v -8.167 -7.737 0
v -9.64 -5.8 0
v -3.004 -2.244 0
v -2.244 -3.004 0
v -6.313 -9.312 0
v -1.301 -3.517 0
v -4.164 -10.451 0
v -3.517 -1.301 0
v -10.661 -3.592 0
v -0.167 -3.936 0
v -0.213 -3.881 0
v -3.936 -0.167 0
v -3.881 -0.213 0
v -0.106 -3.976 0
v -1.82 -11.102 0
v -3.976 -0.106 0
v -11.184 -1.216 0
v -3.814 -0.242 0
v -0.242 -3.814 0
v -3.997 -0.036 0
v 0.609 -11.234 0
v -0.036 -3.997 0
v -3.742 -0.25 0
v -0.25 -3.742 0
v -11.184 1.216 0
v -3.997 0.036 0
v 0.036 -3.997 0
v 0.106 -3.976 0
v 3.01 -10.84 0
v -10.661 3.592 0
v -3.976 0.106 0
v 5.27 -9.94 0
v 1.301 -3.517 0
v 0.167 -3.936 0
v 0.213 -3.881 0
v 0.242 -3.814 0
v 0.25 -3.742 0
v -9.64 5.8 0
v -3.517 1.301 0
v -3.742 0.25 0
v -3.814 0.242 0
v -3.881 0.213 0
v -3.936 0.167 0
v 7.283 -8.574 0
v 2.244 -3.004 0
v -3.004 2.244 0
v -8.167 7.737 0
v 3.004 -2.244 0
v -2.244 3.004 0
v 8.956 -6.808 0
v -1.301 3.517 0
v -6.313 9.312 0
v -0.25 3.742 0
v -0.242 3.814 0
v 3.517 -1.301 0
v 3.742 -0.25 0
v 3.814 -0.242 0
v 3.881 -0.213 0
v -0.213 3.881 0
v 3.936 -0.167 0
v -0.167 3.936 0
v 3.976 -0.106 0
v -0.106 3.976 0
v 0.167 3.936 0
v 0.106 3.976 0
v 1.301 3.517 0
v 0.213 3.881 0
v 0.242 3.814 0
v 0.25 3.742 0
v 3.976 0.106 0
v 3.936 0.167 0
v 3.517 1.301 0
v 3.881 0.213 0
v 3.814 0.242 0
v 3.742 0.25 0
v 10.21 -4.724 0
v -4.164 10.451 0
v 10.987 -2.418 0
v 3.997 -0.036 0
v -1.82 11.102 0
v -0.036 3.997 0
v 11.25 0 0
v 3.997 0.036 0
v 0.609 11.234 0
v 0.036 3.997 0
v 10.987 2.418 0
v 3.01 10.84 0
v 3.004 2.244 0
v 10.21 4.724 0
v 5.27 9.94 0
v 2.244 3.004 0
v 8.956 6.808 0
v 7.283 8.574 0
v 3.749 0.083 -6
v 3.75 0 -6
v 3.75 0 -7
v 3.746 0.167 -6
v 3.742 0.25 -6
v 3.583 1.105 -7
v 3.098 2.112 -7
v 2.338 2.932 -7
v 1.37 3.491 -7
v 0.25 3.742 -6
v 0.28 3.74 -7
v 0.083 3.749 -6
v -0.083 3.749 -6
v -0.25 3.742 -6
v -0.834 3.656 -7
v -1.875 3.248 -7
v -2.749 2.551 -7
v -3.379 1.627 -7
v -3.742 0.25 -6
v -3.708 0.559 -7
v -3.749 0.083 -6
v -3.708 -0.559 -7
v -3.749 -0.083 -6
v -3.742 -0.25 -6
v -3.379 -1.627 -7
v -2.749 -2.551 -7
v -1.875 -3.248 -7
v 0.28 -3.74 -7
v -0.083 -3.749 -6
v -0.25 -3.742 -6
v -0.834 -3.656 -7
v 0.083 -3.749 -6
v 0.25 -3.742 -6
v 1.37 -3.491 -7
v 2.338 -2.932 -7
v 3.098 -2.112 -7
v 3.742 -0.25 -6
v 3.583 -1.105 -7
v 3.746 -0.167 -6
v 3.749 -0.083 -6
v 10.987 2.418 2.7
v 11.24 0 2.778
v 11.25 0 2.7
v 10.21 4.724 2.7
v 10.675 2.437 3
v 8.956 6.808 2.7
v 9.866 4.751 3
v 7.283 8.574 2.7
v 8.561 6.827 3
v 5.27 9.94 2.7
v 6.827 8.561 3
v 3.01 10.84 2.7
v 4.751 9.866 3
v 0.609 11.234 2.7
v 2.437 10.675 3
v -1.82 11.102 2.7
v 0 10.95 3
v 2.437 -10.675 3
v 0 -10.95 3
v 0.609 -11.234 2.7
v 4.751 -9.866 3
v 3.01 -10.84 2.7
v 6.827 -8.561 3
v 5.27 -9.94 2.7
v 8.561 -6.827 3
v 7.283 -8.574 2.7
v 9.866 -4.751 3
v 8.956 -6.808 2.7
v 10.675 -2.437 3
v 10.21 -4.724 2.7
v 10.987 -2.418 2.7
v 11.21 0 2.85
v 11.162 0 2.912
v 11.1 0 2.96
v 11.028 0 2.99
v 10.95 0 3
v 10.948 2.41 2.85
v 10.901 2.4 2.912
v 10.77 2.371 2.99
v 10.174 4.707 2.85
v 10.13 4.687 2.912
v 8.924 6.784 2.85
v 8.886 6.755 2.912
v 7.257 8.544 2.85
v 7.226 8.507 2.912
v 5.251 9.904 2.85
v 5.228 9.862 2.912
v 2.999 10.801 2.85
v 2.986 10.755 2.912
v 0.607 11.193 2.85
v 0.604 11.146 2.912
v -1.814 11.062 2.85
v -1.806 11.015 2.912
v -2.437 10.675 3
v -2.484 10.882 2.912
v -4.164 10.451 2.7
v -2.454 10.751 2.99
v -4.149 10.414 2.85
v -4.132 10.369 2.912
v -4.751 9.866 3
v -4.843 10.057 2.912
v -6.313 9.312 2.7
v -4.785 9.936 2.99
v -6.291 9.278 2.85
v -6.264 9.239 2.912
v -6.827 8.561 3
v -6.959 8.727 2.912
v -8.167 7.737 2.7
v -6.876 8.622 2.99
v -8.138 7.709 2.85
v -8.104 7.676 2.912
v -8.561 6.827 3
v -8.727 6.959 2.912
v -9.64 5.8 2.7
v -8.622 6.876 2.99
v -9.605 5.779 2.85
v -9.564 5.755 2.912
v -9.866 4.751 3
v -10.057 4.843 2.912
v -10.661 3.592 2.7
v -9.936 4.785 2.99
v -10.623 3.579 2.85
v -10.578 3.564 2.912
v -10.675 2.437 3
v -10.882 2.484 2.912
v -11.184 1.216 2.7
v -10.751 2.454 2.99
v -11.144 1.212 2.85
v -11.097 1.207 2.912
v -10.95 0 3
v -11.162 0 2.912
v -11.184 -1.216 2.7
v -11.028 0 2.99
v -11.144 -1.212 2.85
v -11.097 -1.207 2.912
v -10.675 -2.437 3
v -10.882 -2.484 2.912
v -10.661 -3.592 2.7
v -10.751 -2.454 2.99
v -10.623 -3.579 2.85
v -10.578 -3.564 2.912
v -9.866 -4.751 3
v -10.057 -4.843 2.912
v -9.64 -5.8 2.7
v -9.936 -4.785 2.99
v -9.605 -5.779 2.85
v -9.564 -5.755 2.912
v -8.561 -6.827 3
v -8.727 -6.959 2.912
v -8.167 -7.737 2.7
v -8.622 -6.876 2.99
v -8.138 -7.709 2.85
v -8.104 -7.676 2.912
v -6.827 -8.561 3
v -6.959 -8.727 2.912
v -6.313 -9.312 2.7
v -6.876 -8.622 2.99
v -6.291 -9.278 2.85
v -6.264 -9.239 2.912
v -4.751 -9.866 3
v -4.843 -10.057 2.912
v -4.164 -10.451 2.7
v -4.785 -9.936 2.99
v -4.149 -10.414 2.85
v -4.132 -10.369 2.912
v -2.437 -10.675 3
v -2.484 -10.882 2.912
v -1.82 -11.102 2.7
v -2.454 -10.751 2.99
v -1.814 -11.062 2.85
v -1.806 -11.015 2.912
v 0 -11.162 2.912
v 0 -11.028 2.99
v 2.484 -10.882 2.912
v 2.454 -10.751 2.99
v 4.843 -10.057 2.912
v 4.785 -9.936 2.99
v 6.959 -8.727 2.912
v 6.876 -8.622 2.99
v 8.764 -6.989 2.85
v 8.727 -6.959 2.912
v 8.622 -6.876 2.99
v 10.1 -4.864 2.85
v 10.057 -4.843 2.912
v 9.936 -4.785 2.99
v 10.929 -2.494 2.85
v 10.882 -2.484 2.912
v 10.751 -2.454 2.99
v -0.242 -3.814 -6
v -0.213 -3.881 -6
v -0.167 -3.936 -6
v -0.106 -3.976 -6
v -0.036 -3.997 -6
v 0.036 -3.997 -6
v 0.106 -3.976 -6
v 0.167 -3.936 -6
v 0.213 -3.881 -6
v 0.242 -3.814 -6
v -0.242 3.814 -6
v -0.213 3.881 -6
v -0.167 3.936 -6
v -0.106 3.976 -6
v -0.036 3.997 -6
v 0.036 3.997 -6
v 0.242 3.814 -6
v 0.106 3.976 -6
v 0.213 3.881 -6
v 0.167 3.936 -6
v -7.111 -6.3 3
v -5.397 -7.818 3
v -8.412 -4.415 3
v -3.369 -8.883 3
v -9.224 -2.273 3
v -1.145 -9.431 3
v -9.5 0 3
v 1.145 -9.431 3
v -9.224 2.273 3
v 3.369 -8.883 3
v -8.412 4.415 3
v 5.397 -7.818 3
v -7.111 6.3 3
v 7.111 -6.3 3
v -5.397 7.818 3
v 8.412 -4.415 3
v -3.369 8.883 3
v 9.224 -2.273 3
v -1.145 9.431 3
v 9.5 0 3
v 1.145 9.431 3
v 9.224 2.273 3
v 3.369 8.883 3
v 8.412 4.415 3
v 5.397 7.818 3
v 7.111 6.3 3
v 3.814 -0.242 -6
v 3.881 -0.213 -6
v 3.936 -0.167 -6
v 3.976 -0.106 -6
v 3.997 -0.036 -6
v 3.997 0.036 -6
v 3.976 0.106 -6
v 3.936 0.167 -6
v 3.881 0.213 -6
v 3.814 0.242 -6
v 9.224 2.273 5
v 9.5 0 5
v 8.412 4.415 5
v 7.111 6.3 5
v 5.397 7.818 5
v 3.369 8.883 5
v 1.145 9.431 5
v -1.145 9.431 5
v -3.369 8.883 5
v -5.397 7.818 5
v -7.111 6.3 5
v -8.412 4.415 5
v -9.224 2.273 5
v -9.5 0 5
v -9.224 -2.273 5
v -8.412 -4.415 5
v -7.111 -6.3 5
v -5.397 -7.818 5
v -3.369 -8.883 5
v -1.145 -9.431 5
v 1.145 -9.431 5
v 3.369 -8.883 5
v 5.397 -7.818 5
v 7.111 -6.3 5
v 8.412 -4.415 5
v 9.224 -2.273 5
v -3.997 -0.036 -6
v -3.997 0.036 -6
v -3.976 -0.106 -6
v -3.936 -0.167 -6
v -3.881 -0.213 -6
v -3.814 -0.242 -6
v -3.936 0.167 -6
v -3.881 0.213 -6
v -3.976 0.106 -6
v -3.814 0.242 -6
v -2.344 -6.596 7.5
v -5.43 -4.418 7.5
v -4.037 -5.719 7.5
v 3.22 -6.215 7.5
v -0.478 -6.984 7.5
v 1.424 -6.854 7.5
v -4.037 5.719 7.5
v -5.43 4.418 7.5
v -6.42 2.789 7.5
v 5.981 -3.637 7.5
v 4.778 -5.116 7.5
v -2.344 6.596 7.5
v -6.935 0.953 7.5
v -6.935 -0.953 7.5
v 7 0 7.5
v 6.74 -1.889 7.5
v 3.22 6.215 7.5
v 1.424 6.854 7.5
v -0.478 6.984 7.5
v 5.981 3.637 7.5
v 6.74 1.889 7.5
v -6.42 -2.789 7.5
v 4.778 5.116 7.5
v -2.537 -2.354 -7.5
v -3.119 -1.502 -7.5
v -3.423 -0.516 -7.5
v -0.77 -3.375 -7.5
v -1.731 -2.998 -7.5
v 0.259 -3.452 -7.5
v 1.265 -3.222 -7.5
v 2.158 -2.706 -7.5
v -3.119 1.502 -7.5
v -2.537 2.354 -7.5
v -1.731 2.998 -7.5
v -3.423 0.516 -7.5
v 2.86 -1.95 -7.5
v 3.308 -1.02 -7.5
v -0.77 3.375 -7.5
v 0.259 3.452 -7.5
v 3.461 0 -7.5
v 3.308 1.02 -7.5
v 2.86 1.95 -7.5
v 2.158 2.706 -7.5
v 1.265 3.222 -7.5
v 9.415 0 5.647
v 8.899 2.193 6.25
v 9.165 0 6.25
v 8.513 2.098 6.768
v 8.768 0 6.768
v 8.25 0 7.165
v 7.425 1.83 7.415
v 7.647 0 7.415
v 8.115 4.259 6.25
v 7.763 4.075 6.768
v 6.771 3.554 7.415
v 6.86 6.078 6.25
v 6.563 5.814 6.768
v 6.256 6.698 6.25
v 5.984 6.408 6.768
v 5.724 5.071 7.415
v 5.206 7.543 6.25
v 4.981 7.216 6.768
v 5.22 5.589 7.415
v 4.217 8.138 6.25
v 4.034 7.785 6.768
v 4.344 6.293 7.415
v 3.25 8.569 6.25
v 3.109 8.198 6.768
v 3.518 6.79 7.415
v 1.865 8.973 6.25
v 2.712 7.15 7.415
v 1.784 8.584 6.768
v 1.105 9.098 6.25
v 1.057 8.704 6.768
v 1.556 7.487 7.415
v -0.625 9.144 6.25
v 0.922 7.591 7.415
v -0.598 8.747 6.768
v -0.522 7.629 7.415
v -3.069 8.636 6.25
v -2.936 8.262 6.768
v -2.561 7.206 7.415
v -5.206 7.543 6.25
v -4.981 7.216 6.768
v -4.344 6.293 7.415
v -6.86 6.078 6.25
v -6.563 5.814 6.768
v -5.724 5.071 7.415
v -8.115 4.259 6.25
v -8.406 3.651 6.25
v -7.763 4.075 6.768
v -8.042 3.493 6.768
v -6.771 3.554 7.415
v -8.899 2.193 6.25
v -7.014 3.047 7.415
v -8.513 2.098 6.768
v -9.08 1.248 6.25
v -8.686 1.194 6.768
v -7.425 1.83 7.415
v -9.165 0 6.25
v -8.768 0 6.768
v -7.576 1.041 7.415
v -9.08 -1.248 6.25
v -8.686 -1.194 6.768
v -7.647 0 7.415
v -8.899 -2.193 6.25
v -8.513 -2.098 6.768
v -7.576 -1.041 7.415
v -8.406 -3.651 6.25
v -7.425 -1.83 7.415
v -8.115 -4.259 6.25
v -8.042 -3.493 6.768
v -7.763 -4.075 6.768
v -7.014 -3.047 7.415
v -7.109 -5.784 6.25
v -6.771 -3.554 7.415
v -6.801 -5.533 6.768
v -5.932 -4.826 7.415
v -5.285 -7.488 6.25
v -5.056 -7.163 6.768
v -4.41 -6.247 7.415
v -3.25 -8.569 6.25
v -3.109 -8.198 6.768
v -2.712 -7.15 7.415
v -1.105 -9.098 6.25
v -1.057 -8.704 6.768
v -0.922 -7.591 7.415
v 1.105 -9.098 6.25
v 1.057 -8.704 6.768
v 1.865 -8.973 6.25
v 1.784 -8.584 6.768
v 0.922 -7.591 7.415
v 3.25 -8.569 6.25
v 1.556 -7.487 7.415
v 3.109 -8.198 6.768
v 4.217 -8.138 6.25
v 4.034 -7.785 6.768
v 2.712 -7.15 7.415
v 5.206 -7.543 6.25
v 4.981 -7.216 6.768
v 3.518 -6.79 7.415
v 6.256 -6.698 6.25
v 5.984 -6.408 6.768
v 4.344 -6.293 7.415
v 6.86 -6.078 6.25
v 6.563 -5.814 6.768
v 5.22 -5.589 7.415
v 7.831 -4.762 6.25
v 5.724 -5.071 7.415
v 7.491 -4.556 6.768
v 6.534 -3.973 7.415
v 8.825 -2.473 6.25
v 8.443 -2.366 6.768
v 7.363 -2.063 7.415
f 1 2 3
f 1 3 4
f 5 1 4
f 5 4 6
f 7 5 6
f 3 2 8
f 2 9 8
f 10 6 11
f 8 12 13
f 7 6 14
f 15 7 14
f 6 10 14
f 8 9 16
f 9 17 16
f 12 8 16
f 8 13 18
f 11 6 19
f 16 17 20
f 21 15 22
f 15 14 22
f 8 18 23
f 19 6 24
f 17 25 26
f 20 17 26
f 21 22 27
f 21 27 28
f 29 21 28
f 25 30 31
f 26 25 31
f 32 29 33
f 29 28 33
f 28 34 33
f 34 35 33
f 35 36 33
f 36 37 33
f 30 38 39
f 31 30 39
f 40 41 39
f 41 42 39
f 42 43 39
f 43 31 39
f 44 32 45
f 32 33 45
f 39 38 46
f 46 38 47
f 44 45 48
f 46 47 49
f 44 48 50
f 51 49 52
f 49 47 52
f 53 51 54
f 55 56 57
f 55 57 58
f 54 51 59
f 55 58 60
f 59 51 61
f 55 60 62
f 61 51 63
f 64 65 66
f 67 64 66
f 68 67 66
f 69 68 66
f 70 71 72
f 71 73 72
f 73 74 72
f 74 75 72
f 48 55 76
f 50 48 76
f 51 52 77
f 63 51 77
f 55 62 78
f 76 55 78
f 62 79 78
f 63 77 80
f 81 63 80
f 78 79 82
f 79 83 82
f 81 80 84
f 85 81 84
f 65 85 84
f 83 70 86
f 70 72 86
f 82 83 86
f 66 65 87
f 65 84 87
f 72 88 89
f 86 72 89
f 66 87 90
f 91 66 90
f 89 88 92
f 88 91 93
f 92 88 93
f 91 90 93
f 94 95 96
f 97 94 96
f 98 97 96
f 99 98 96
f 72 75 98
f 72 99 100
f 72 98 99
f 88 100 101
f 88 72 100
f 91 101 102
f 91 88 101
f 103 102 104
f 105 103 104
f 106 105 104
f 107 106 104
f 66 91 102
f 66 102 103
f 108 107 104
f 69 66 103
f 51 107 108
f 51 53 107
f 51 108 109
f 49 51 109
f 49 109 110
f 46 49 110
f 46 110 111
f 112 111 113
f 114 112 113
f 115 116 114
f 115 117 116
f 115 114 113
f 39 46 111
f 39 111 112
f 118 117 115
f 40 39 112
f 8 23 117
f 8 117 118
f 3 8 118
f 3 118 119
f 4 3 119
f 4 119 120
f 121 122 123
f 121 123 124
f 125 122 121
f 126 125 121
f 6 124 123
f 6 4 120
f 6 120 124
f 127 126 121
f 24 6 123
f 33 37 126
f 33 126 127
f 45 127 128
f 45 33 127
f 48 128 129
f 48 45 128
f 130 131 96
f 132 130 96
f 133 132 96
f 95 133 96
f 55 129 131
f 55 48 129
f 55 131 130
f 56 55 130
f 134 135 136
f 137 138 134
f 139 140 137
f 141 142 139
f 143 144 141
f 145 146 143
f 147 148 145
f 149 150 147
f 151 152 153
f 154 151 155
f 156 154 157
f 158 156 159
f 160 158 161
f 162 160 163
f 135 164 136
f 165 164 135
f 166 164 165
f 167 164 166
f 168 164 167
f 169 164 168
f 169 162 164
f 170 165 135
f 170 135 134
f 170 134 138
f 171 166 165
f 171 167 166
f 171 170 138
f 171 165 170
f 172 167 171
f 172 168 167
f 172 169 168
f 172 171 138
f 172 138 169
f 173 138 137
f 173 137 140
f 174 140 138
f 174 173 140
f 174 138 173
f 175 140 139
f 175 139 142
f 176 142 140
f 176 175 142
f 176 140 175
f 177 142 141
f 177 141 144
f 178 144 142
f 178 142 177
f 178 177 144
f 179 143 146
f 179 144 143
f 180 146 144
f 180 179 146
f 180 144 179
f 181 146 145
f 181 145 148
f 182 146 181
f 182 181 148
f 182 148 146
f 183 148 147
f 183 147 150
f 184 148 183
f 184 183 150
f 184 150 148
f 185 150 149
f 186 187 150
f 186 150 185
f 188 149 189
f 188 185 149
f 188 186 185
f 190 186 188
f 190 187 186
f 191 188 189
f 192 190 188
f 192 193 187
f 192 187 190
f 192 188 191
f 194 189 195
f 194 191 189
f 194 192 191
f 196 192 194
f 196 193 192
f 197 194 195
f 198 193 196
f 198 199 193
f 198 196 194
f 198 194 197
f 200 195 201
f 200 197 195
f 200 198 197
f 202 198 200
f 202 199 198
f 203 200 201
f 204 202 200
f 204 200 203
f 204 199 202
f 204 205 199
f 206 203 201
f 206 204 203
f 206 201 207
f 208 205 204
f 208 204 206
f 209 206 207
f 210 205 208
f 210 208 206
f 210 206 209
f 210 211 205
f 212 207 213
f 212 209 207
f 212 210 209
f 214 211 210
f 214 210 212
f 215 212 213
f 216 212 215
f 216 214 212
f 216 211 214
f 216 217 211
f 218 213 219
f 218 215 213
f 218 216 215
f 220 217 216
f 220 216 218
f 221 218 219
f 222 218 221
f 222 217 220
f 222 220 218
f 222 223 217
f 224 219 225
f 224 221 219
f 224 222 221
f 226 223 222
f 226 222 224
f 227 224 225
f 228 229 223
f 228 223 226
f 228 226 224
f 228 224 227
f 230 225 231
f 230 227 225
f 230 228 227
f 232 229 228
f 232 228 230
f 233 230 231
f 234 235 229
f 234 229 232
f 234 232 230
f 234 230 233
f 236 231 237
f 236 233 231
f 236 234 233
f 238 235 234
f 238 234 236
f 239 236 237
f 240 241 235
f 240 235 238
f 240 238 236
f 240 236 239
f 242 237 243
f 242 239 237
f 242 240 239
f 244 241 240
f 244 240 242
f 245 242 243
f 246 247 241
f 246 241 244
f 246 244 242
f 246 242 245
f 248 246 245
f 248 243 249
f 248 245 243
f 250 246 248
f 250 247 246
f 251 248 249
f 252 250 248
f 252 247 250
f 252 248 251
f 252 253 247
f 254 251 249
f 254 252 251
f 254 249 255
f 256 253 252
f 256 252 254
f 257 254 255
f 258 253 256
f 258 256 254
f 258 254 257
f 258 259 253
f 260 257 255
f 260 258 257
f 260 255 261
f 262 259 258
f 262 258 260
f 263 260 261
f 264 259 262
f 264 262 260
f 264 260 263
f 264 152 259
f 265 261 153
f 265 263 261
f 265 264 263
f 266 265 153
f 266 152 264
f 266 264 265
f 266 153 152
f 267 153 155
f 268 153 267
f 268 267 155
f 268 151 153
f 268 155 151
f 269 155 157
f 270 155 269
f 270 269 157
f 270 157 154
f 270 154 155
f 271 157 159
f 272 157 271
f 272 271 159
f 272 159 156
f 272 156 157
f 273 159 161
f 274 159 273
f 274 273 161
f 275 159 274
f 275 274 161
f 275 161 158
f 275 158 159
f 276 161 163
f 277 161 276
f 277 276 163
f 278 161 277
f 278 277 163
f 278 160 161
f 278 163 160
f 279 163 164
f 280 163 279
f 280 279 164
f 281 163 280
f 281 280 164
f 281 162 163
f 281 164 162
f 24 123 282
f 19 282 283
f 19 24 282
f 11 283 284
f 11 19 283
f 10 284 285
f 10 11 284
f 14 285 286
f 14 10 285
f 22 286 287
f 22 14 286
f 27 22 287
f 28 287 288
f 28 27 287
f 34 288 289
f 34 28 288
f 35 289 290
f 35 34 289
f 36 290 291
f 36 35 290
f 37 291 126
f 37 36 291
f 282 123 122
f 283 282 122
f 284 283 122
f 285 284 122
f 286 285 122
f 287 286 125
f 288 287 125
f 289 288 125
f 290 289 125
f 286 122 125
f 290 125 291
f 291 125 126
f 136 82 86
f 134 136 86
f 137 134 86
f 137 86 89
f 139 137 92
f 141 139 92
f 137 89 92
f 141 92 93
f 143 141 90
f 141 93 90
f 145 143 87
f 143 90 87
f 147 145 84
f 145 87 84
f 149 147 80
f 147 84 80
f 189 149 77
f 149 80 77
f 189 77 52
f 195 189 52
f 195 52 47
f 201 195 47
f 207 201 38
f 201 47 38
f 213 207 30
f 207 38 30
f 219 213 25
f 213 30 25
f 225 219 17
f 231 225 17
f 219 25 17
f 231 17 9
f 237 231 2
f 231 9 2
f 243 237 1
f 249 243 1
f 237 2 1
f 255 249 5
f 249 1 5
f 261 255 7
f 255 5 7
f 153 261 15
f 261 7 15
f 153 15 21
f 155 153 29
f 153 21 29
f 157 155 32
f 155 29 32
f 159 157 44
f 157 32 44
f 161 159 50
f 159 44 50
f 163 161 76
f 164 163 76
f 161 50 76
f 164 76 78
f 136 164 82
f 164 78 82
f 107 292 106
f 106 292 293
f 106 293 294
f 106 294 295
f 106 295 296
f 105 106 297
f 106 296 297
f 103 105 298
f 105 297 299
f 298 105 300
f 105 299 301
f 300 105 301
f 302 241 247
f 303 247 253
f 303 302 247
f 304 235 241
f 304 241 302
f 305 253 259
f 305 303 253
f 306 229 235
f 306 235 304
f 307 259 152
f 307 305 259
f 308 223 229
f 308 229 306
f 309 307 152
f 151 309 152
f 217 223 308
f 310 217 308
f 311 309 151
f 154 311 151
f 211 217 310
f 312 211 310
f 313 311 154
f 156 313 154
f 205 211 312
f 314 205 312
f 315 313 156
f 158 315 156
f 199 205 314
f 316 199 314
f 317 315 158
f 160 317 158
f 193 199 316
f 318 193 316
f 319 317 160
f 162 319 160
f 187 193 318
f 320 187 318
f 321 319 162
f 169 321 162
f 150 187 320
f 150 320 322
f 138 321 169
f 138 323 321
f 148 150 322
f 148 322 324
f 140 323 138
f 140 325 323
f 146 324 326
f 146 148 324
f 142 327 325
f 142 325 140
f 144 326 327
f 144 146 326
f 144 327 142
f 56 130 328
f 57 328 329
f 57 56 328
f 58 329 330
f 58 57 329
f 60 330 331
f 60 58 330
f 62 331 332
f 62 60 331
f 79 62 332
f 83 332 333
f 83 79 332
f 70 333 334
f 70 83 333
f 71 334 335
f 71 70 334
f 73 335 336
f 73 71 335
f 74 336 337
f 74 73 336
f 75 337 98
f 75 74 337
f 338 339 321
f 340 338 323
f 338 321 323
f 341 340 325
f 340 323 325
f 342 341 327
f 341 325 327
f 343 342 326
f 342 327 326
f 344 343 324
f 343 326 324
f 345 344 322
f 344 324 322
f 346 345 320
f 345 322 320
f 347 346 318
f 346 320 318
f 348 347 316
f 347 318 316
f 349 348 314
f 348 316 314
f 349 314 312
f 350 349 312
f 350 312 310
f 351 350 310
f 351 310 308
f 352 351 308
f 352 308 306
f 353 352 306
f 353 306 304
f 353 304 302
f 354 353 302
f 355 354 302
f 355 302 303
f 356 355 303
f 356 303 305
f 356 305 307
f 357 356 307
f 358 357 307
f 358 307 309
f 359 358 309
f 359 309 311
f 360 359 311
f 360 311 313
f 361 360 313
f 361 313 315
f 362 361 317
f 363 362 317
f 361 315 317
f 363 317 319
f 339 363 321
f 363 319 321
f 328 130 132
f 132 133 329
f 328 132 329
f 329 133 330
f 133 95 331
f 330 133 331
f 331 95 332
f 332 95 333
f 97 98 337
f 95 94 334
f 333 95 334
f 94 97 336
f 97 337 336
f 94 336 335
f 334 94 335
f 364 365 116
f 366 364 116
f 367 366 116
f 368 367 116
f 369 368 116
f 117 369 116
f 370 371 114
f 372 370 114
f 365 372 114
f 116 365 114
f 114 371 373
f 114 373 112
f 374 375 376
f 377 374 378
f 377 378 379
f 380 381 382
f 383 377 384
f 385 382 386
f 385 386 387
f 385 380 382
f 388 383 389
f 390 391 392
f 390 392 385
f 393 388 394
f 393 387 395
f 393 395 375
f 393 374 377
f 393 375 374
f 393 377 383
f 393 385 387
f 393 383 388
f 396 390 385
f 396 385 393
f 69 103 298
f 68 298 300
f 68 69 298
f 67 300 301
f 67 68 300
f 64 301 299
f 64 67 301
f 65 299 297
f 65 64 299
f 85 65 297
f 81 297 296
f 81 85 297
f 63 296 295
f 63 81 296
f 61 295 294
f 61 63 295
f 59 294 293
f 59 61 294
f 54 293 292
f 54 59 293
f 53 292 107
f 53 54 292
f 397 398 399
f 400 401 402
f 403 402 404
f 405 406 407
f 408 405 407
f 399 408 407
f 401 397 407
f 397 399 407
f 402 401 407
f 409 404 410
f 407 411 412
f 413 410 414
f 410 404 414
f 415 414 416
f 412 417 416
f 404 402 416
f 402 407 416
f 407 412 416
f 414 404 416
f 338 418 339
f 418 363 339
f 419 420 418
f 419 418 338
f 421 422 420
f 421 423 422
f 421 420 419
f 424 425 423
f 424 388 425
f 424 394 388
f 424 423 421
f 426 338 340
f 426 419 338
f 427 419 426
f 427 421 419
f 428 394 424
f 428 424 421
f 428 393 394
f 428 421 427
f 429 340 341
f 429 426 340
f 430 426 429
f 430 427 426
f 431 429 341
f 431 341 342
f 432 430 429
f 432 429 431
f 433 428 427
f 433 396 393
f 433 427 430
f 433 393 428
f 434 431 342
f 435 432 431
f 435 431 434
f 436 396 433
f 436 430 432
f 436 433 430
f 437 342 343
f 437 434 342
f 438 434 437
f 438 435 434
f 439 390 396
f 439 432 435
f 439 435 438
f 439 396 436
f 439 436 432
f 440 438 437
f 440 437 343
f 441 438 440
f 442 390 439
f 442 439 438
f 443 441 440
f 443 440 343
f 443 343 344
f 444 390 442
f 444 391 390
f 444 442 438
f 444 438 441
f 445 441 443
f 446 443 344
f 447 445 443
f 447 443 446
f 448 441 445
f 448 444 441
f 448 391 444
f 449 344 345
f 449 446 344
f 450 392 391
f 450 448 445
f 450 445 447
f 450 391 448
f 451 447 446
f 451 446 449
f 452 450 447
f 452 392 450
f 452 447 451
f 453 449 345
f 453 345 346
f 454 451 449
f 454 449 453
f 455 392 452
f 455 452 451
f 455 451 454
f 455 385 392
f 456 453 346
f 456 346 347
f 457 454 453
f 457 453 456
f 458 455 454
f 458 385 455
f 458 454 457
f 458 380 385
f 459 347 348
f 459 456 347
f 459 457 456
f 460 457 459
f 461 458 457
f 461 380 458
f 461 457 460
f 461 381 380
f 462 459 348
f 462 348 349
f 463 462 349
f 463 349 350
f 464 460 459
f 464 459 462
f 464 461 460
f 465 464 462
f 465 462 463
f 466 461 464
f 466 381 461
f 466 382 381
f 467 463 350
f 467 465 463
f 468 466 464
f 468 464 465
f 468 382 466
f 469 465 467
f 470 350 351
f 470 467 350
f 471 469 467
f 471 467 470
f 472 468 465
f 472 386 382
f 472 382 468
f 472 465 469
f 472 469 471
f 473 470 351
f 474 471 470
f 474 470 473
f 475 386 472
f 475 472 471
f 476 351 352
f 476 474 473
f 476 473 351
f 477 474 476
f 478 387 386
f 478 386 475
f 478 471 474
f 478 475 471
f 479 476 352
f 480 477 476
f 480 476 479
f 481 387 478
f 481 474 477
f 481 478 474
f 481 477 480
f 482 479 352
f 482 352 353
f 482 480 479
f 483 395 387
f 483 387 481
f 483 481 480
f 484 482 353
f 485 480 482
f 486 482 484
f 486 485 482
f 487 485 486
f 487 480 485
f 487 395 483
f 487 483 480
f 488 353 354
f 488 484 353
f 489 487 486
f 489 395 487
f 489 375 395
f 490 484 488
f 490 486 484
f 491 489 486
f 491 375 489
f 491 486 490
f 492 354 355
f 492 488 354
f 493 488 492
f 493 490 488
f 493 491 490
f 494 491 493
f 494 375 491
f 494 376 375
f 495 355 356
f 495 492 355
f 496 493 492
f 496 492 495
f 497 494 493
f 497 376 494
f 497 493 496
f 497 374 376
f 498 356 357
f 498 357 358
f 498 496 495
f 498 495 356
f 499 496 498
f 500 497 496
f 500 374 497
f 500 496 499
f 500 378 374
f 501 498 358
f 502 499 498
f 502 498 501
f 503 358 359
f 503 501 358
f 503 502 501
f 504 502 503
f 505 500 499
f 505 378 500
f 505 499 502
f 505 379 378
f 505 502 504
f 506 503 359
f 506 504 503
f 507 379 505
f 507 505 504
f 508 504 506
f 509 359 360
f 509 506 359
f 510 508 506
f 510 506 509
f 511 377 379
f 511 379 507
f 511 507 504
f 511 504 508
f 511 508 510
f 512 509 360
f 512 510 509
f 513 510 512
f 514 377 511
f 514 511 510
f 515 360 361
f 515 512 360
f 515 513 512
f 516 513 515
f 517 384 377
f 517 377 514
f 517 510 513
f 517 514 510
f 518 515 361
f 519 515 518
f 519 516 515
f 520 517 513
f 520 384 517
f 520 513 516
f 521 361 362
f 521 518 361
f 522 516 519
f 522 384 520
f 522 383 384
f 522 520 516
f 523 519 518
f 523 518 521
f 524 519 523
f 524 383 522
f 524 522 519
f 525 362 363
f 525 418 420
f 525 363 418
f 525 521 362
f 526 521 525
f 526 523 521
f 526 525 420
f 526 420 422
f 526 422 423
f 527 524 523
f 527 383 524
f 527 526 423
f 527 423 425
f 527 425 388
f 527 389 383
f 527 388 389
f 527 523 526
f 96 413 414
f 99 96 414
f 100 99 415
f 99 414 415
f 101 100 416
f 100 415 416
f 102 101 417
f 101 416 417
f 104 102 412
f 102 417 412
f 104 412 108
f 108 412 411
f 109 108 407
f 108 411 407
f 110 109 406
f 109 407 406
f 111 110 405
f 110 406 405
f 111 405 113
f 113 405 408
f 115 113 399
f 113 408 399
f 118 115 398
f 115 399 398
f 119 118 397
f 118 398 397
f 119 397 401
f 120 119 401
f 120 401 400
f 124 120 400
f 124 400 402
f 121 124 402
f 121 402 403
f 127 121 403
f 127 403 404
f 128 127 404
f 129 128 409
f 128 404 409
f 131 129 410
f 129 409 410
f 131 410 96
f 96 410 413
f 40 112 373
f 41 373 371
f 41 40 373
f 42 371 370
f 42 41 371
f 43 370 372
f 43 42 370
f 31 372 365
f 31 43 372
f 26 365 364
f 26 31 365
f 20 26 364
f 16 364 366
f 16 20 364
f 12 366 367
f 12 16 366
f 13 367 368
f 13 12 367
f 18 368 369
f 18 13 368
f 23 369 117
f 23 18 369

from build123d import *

# Parameters (mm, degrees)
F0_R     = 11.25
F1_DEPTH = 3
F2_R     = 9.5
F3_DEPTH = 7.5
F4_R     = 3.75
F5_DEPTH = 7.5
F6_R     = 0.25
F7_DEPTH = 6
F8_SIZE2 = 0.288675
F8_SIZE  = 0.5
F9_R     = 0.3
F10_R    = 2.5


with BuildPart() as f1:
    # F0 (on Top) → F1 (new body)
    with BuildSketch(Plane.XY):
        Circle(F0_R)
    extrude(amount=F1_DEPTH)

    # F2 (on Top) → F3 (join)
    with BuildSketch(Plane.XY):
        Circle(F2_R)
    extrude(amount=F3_DEPTH)

    # F4 (on Top) → F5 (join)
    with BuildSketch(Plane.XY):
        Circle(F4_R)
    extrude(amount=-F5_DEPTH)

    # F6 (on Top) → F7 (join)
    with BuildSketch(Plane.XY):
        with Locations((0, 3.75)):
            Circle(F6_R)
        with Locations((3.75, 0)):
            Circle(F6_R)
        with Locations((0, -3.75)):
            Circle(F6_R)
        with Locations((-3.75, 0)):
            Circle(F6_R)
    extrude(amount=-F7_DEPTH)

    # F8
    f8_edges = [f1.edges().sort_by_distance(p)[0] for p in [
        (-3.75, 0, -7.5),
    ]]
    chamfer(f8_edges, length=F8_SIZE, length2=F8_SIZE2)

    # F9
    f9_edges = [f1.edges().sort_by_distance(p)[0] for p in [
        (-11.25, 0, 3),
    ]]
    fillet(f9_edges, radius=F9_R)

    # F10
    f10_edges = [f1.edges().sort_by_distance(p)[0] for p in [
        (-9.5, 0, 7.5),
    ]]
    fillet(f10_edges, radius=F10_R)


solid = f1.part
